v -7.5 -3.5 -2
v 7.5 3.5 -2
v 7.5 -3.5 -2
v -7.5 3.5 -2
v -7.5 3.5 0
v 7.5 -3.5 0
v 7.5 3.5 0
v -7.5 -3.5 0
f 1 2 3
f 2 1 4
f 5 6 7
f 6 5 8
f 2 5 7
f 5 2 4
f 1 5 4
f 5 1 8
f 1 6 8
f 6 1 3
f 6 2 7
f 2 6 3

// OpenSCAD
// file: ../p/4-4edge.scad
use <../lib.scad>
$fa=1; $fs=0.2;
function ldraw_lib__4_4edge(realsolid=false) = [
// 0 Circle 1.0
// 0 Name: 4-4edge.dat
// 0 Author: James Jessiman
// 0 !LDRAW_ORG Primitive UPDATE 2017-01
// 0 !LICENSE Licensed under CC BY 2.0 and CC BY 4.0 : see CAreadme.txt
// 
// 0 BFC CERTIFY CCW
  [0,"BFC","CERTIFY"],
  [0,"BFC","CCW"],
// 
// 0 !HISTORY 1998-12-15 [PTadmin] Official Update 1998-10
// 0 !HISTORY 2005-12-28 [PTadmin] Official Update 2005-01
// 0 !HISTORY 2007-06-24 [PTadmin] Header formatted for Contributor Agreement
// 0 !HISTORY 2008-07-01 [PTadmin] Official Update 2008-01
// 0 !HISTORY 2017-01-15 [Steffen] BFCed
// 0 !HISTORY 2017-12-30 [PTadmin] Official Update 2017-01
// 
// 
// 2 24 1 0 0 0.9239 0 0.3827
  [2,24,1,0,0,0.9239,0,0.3827],
// 2 24 0.9239 0 0.3827 0.7071 0 0.7071
  [2,24,0.9239,0,0.3827,0.7071,0,0.7071],
// 2 24 0.7071 0 0.7071 0.3827 0 0.9239
  [2,24,0.7071,0,0.7071,0.3827,0,0.9239],
// 2 24 0.3827 0 0.9239 0 0 1
  [2,24,0.3827,0,0.9239,0,0,1],
// 2 24 0 0 1 -0.3827 0 0.9239
  [2,24,0,0,1,-0.3827,0,0.9239],
// 2 24 -0.3827 0 0.9239 -0.7071 0 0.7071
  [2,24,-0.3827,0,0.9239,-0.7071,0,0.7071],
// 2 24 -0.7071 0 0.7071 -0.9239 0 0.3827
  [2,24,-0.7071,0,0.7071,-0.9239,0,0.3827],
// 2 24 -0.9239 0 0.3827 -1 0 -0
  [2,24,-0.9239,0,0.3827,-1,0,-0],
// 2 24 -1 0 -0 -0.9239 0 -0.3827
  [2,24,-1,0,-0,-0.9239,0,-0.3827],
// 2 24 -0.9239 0 -0.3827 -0.7071 0 -0.7071
  [2,24,-0.9239,0,-0.3827,-0.7071,0,-0.7071],
// 2 24 -0.7071 0 -0.7071 -0.3827 0 -0.9239
  [2,24,-0.7071,0,-0.7071,-0.3827,0,-0.9239],
// 2 24 -0.3827 0 -0.9239 0 0 -1
  [2,24,-0.3827,0,-0.9239,0,0,-1],
// 2 24 0 0 -1 0.3827 0 -0.9239
  [2,24,0,0,-1,0.3827,0,-0.9239],
// 2 24 0.3827 0 -0.9239 0.7071 0 -0.7071
  [2,24,0.3827,0,-0.9239,0.7071,0,-0.7071],
// 2 24 0.7071 0 -0.7071 0.9239 0 -0.3827
  [2,24,0.7071,0,-0.7071,0.9239,0,-0.3827],
// 2 24 0.9239 0 -0.3827 1 0 0
  [2,24,0.9239,0,-0.3827,1,0,0],
];
module ldraw_lib__4_4edge(step=0, col=false, unit=2/5, alt=false, line=0.2, solid=!$preview)
    makepoly(ldraw_lib__4_4edge(solid), step=step, col=col, unit=unit, alt=alt, line=line, solid=solid);
ldraw_lib__4_4edge(line=0.2);
// file: ../p/4-4disc.scad
use <../lib.scad>
$fa=1; $fs=0.2;
function ldraw_lib__4_4disc(realsolid=false) = [
// 0 Disc 1.0
// 0 Name: 4-4disc.dat
// 0 Author: James Jessiman
// 0 !LDRAW_ORG Primitive UPDATE 2002-02
// 0 !LICENSE Licensed under CC BY 2.0 and CC BY 4.0 : see CAreadme.txt
// 
// 0 BFC CERTIFY CCW
  [0,"BFC","CERTIFY"],
  [0,"BFC","CCW"],
// 
// 0 !HISTORY 1998-12-15 [PTadmin] Official Update 1998-10
// 0 !HISTORY 2002-03-23 [sbliss] Added BFC statement
// 0 !HISTORY 2002-04-25 [PTadmin] Official Update 2002-02
// 0 !HISTORY 2007-06-24 [PTadmin] Header formatted for Contributor Agreement
// 0 !HISTORY 2008-07-01 [PTadmin] Official Update 2008-01
// 
// 
// 3 16 0 0 0 1 0 0 0.9239 0 0.3827
  [3,16,0,0,0,1,0,0,0.9239,0,0.3827],
// 3 16 0 0 0 0.9239 0 0.3827 0.7071 0 0.7071
  [3,16,0,0,0,0.9239,0,0.3827,0.7071,0,0.7071],
// 3 16 0 0 0 0.7071 0 0.7071 0.3827 0 0.9239
  [3,16,0,0,0,0.7071,0,0.7071,0.3827,0,0.9239],
// 3 16 0 0 0 0.3827 0 0.9239 0 0 1
  [3,16,0,0,0,0.3827,0,0.9239,0,0,1],
// 3 16 0 0 0 0 0 1 -0.3827 0 0.9239
  [3,16,0,0,0,0,0,1,-0.3827,0,0.9239],
// 3 16 0 0 0 -0.3827 0 0.9239 -0.7071 0 0.7071
  [3,16,0,0,0,-0.3827,0,0.9239,-0.7071,0,0.7071],
// 3 16 0 0 0 -0.7071 0 0.7071 -0.9239 0 0.3827
  [3,16,0,0,0,-0.7071,0,0.7071,-0.9239,0,0.3827],
// 3 16 0 0 0 -0.9239 0 0.3827 -1 0 -0
  [3,16,0,0,0,-0.9239,0,0.3827,-1,0,-0],
// 3 16 0 0 0 -1 0 -0 -0.9239 0 -0.3827
  [3,16,0,0,0,-1,0,-0,-0.9239,0,-0.3827],
// 3 16 0 0 0 -0.9239 0 -0.3827 -0.7071 0 -0.7071
  [3,16,0,0,0,-0.9239,0,-0.3827,-0.7071,0,-0.7071],
// 3 16 0 0 0 -0.7071 0 -0.7071 -0.3827 0 -0.9239
  [3,16,0,0,0,-0.7071,0,-0.7071,-0.3827,0,-0.9239],
// 3 16 0 0 0 -0.3827 0 -0.9239 0 0 -1
  [3,16,0,0,0,-0.3827,0,-0.9239,0,0,-1],
// 3 16 0 0 0 0 0 -1 0.3827 0 -0.9239
  [3,16,0,0,0,0,0,-1,0.3827,0,-0.9239],
// 3 16 0 0 0 0.3827 0 -0.9239 0.7071 0 -0.7071
  [3,16,0,0,0,0.3827,0,-0.9239,0.7071,0,-0.7071],
// 3 16 0 0 0 0.7071 0 -0.7071 0.9239 0 -0.3827
  [3,16,0,0,0,0.7071,0,-0.7071,0.9239,0,-0.3827],
// 3 16 0 0 0 0.9239 0 -0.3827 1 0 0
  [3,16,0,0,0,0.9239,0,-0.3827,1,0,0],
// 0
];
module ldraw_lib__4_4disc(step=0, col=false, unit=2/5, alt=false, line=0.2, solid=!$preview)
    makepoly(ldraw_lib__4_4disc(solid), step=step, col=col, unit=unit, alt=alt, line=line, solid=solid);
ldraw_lib__4_4disc(line=0.2);
// file: ../p/4-4cyli.scad
use <../lib.scad>
$fa=1; $fs=0.2;
function ldraw_lib__4_4cyli(realsolid=false) = [
// 0 Cylinder 1.0
// 0 Name: 4-4cyli.dat
// 0 Author: James Jessiman
// 0 !LDRAW_ORG Primitive UPDATE 2005-01
// 0 !LICENSE Licensed under CC BY 2.0 and CC BY 4.0 : see CAreadme.txt
// 
// 0 BFC CERTIFY CCW
  [0,"BFC","CERTIFY"],
  [0,"BFC","CCW"],
// 
// 0 !HISTORY 1998-12-15 [PTadmin] Official Update 1998-10
// 0 !HISTORY 2002-03-23 [sbliss] Added BFC statement; merged headers from files in distributions LDraw 0.27 and Complete.
// 0 !HISTORY 2002-04-25 [PTadmin] Official Update 2002-02
// 0 !HISTORY 2004-12-14 [guyvivan] BFC CCW
// 0 !HISTORY 2005-12-28 [PTadmin] Official Update 2005-01
// 0 !HISTORY 2007-06-24 [PTadmin] Header formatted for Contributor Agreement
// 0 !HISTORY 2008-07-01 [PTadmin] Official Update 2008-01
// 
// 
// 4 16 1 1 0 0.9239 1 0.3827 0.9239 0 0.3827 1 0 0
  [4,16,1,1,0,0.9239,1,0.3827,0.9239,0,0.3827,1,0,0],
// 5 24 1 0 0 1 1 0 0.9239 0 0.3827 0.9239 0 -0.3827
  [5,24,1,0,0,1,1,0,0.9239,0,0.3827,0.9239,0,-0.3827],
// 4 16 0.9239 1 0.3827 0.7071 1 0.7071 0.7071 0 0.7071 0.9239 0 0.3827
  [4,16,0.9239,1,0.3827,0.7071,1,0.7071,0.7071,0,0.7071,0.9239,0,0.3827],
// 5 24 0.9239 0 0.3827 0.9239 1 0.3827 0.7071 0 0.7071 1 0 0
  [5,24,0.9239,0,0.3827,0.9239,1,0.3827,0.7071,0,0.7071,1,0,0],
// 4 16 0.7071 1 0.7071 0.3827 1 0.9239 0.3827 0 0.9239 0.7071 0 0.7071
  [4,16,0.7071,1,0.7071,0.3827,1,0.9239,0.3827,0,0.9239,0.7071,0,0.7071],
// 5 24 0.7071 0 0.7071 0.7071 1 0.7071 0.3827 0 0.9239 0.9239 0 0.3827
  [5,24,0.7071,0,0.7071,0.7071,1,0.7071,0.3827,0,0.9239,0.9239,0,0.3827],
// 4 16 0.3827 1 0.9239 0 1 1 0 0 1 0.3827 0 0.9239
  [4,16,0.3827,1,0.9239,0,1,1,0,0,1,0.3827,0,0.9239],
// 5 24 0.3827 0 0.9239 0.3827 1 0.9239 0 0 1 0.7071 0 0.7071
  [5,24,0.3827,0,0.9239,0.3827,1,0.9239,0,0,1,0.7071,0,0.7071],
// 4 16 0 1 1 -0.3827 1 0.9239 -0.3827 0 0.9239 0 0 1
  [4,16,0,1,1,-0.3827,1,0.9239,-0.3827,0,0.9239,0,0,1],
// 5 24 0 0 1 0 1 1 -0.3827 0 0.9239 0.3827 0 0.9239
  [5,24,0,0,1,0,1,1,-0.3827,0,0.9239,0.3827,0,0.9239],
// 4 16 -0.3827 1 0.9239 -0.7071 1 0.7071 -0.7071 0 0.7071 -0.3827 0 0.9239
  [4,16,-0.3827,1,0.9239,-0.7071,1,0.7071,-0.7071,0,0.7071,-0.3827,0,0.9239],
// 5 24 -0.3827 0 0.9239 -0.3827 1 0.9239 -0.7071 0 0.7071 0 0 1
  [5,24,-0.3827,0,0.9239,-0.3827,1,0.9239,-0.7071,0,0.7071,0,0,1],
// 4 16 -0.7071 1 0.7071 -0.9239 1 0.3827 -0.9239 0 0.3827 -0.7071 0 0.7071
  [4,16,-0.7071,1,0.7071,-0.9239,1,0.3827,-0.9239,0,0.3827,-0.7071,0,0.7071],
// 5 24 -0.7071 0 0.7071 -0.7071 1 0.7071 -0.9239 0 0.3827 -0.3827 0 0.9239
  [5,24,-0.7071,0,0.7071,-0.7071,1,0.7071,-0.9239,0,0.3827,-0.3827,0,0.9239],
// 4 16 -0.9239 1 0.3827 -1 1 0 -1 0 0 -0.9239 0 0.3827
  [4,16,-0.9239,1,0.3827,-1,1,0,-1,0,0,-0.9239,0,0.3827],
// 5 24 -0.9239 0 0.3827 -0.9239 1 0.3827 -1 0 0 -0.7071 0 0.7071
  [5,24,-0.9239,0,0.3827,-0.9239,1,0.3827,-1,0,0,-0.7071,0,0.7071],
// 4 16 -1 1 0 -0.9239 1 -0.3827 -0.9239 0 -0.3827 -1 0 0
  [4,16,-1,1,0,-0.9239,1,-0.3827,-0.9239,0,-0.3827,-1,0,0],
// 5 24 -1 0 0 -1 1 0 -0.9239 0 -0.3827 -0.9239 0 0.3827
  [5,24,-1,0,0,-1,1,0,-0.9239,0,-0.3827,-0.9239,0,0.3827],
// 4 16 -0.9239 1 -0.3827 -0.7071 1 -0.7071 -0.7071 0 -0.7071 -0.9239 0 -0.3827
  [4,16,-0.9239,1,-0.3827,-0.7071,1,-0.7071,-0.7071,0,-0.7071,-0.9239,0,-0.3827],
// 5 24 -0.9239 0 -0.3827 -0.9239 1 -0.3827 -0.7071 0 -0.7071 -1 0 0
  [5,24,-0.9239,0,-0.3827,-0.9239,1,-0.3827,-0.7071,0,-0.7071,-1,0,0],
// 4 16 -0.7071 1 -0.7071 -0.3827 1 -0.9239 -0.3827 0 -0.9239 -0.7071 0 -0.7071
  [4,16,-0.7071,1,-0.7071,-0.3827,1,-0.9239,-0.3827,0,-0.9239,-0.7071,0,-0.7071],
// 5 24 -0.7071 0 -0.7071 -0.7071 1 -0.7071 -0.3827 0 -0.9239 -0.9239 0 -0.3827
  [5,24,-0.7071,0,-0.7071,-0.7071,1,-0.7071,-0.3827,0,-0.9239,-0.9239,0,-0.3827],
// 4 16 -0.3827 1 -0.9239 0 1 -1 0 0 -1 -0.3827 0 -0.9239
  [4,16,-0.3827,1,-0.9239,0,1,-1,0,0,-1,-0.3827,0,-0.9239],
// 5 24 -0.3827 0 -0.9239 -0.3827 1 -0.9239 0 0 -1 -0.7071 0 -0.7071
  [5,24,-0.3827,0,-0.9239,-0.3827,1,-0.9239,0,0,-1,-0.7071,0,-0.7071],
// 4 16 0 1 -1 0.3827 1 -0.9239 0.3827 0 -0.9239 0 0 -1
  [4,16,0,1,-1,0.3827,1,-0.9239,0.3827,0,-0.9239,0,0,-1],
// 5 24 0 0 -1 0 1 -1 0.3827 0 -0.9239 -0.3827 0 -0.9239
  [5,24,0,0,-1,0,1,-1,0.3827,0,-0.9239,-0.3827,0,-0.9239],
// 4 16 0.3827 1 -0.9239 0.7071 1 -0.7071 0.7071 0 -0.7071 0.3827 0 -0.9239
  [4,16,0.3827,1,-0.9239,0.7071,1,-0.7071,0.7071,0,-0.7071,0.3827,0,-0.9239],
// 5 24 0.3827 0 -0.9239 0.3827 1 -0.9239 0.7071 0 -0.7071 0 0 -1
  [5,24,0.3827,0,-0.9239,0.3827,1,-0.9239,0.7071,0,-0.7071,0,0,-1],
// 4 16 0.7071 1 -0.7071 0.9239 1 -0.3827 0.9239 0 -0.3827 0.7071 0 -0.7071
  [4,16,0.7071,1,-0.7071,0.9239,1,-0.3827,0.9239,0,-0.3827,0.7071,0,-0.7071],
// 5 24 0.7071 0 -0.7071 0.7071 1 -0.7071 0.9239 0 -0.3827 0.3827 0 -0.9239
  [5,24,0.7071,0,-0.7071,0.7071,1,-0.7071,0.9239,0,-0.3827,0.3827,0,-0.9239],
// 4 16 0.9239 1 -0.3827 1 1 0 1 0 0 0.9239 0 -0.3827
  [4,16,0.9239,1,-0.3827,1,1,0,1,0,0,0.9239,0,-0.3827],
// 5 24 0.9239 0 -0.3827 0.9239 1 -0.3827 1 0 0 0.7071 0 -0.7071
  [5,24,0.9239,0,-0.3827,0.9239,1,-0.3827,1,0,0,0.7071,0,-0.7071],
// 0
];
module ldraw_lib__4_4cyli(step=0, col=false, unit=2/5, alt=false, line=0.2, solid=!$preview)
    makepoly(ldraw_lib__4_4cyli(solid), step=step, col=col, unit=unit, alt=alt, line=line, solid=solid);
ldraw_lib__4_4cyli(line=0.2);
// file: ../p/stud3.scad
use <../lib.scad>
use <4-4cyli.scad>
use <4-4disc.scad>
use <4-4edge.scad>
$fa=1; $fs=0.2;
function ldraw_lib__stud3(realsolid=false) = realsolid ? 
    [openscad(translate([0,0,-eps()], o=cylinder(4+eps(), r=4)),2)] : [
// 0 Stud Tube Solid
// 0 Name: stud3.dat
// 0 Author: James Jessiman
// 0 !LDRAW_ORG Primitive UPDATE 2012-01
// 0 !LICENSE Licensed under CC BY 2.0 and CC BY 4.0 : see CAreadme.txt
// 
// 0 BFC CERTIFY CCW
  [0,"BFC","CERTIFY"],
  [0,"BFC","CCW"],
// 
// 0 !HISTORY 2002-04-04 [sbliss] Modified for BFC compliance
// 0 !HISTORY 2002-04-25 [PTadmin] Official Update 2002-02
// 0 !HISTORY 2007-06-24 [PTadmin] Header formatted for Contributor Agreement
// 0 !HISTORY 2008-07-01 [PTadmin] Official Update 2008-01
// 0 !HISTORY 2012-02-16 [Philo] Changed to CCW
// 0 !HISTORY 2012-03-30 [PTadmin] Official Update 2012-01
// 
// 
// 1 16 0 -4 0 4 0 0 0 1 0 0 0 4 4-4edge.dat
  [1,16,0,-4,0,4,0,0,0,1,0,0,0,4, ldraw_lib__4_4edge(realsolid)],
// 1 16 0 0 0 4 0 0 0 1 0 0 0 4 4-4edge.dat
  [1,16,0,0,0,4,0,0,0,1,0,0,0,4, ldraw_lib__4_4edge(realsolid)],
// 1 16 0 -4 0 4 0 0 0 1 0 0 0 4 4-4disc.dat
  [1,16,0,-4,0,4,0,0,0,1,0,0,0,4, ldraw_lib__4_4disc(realsolid)],
// 1 16 0 -4 0 4 0 0 0 4 0 0 0 4 4-4cyli.dat
  [1,16,0,-4,0,4,0,0,0,4,0,0,0,4, ldraw_lib__4_4cyli(realsolid)],
];
module ldraw_lib__stud3(step=0, col=false, unit=2/5, alt=false, line=0.2, solid=!$preview)
    makepoly(ldraw_lib__stud3(solid), step=step, col=col, unit=unit, alt=alt, line=line, solid=solid);
ldraw_lib__stud3(line=0.2);
// file: ../p/stud.scad
use <../lib.scad>
use <4-4cyli.scad>
use <4-4disc.scad>
use <4-4edge.scad>
$fa=1; $fs=0.2;
function ldraw_lib__stud(realsolid=false) = realsolid ? 
    [openscad(translate([0,0,-eps()], o=cylinder(4+eps(), r=6)),2)] : [
// 0 Stud
// 0 Name: stud.dat
// 0 Author: James Jessiman
// 0 !LDRAW_ORG Primitive UPDATE 2012-01
// 0 !LICENSE Licensed under CC BY 2.0 and CC BY 4.0 : see CAreadme.txt
// 
// 0 BFC CERTIFY CCW
  [0,"BFC","CERTIFY"],
  [0,"BFC","CCW"],
// 
// 0 !HISTORY 2002-04-04 [sbliss] Modified for BFC compliance
// 0 !HISTORY 2002-04-25 [PTadmin] Official Update 2002-02
// 0 !HISTORY 2007-06-24 [PTadmin] Header formatted for Contributor Agreement
// 0 !HISTORY 2008-07-01 [PTadmin] Official Update 2008-01
// 0 !HISTORY 2012-02-16 [Philo] Changed to CCW
// 0 !HISTORY 2012-03-30 [PTadmin] Official Update 2012-01
// 
// 
// 1 16 0 0 0 6 0 0 0 1 0 0 0 6 4-4edge.dat
  [1,16,0,0,0,6,0,0,0,1,0,0,0,6, ldraw_lib__4_4edge(realsolid)],
// 1 16 0 -4 0 6 0 0 0 1 0 0 0 6 4-4edge.dat
  [1,16,0,-4,0,6,0,0,0,1,0,0,0,6, ldraw_lib__4_4edge(realsolid)],
// 1 16 0 0 0 6 0 0 0 -4 0 0 0 6 4-4cyli.dat
  [1,16,0,0,0,6,0,0,0,-4,0,0,0,6, ldraw_lib__4_4cyli(realsolid)],
// 1 16 0 -4 0 6 0 0 0 1 0 0 0 6 4-4disc.dat
  [1,16,0,-4,0,6,0,0,0,1,0,0,0,6, ldraw_lib__4_4disc(realsolid)],
];
module ldraw_lib__stud(step=0, col=false, unit=2/5, alt=false, line=0.2, solid=!$preview)
    makepoly(ldraw_lib__stud(solid), step=step, col=col, unit=unit, alt=alt, line=line, solid=solid);
ldraw_lib__stud(line=0.2);
// file: ../p/box5.scad
use <../lib.scad>
$fa=1; $fs=0.2;
function ldraw_lib__box5(realsolid=false) = [
// 0 Box with 5 Faces and All Edges
// 0 Name: box5.dat
// 0 Author: James Jessiman
// 0 !LDRAW_ORG Primitive UPDATE 2012-01
// 0 !LICENSE Licensed under CC BY 2.0 and CC BY 4.0 : see CAreadme.txt
// 
// 0 BFC CERTIFY CCW
  [0,"BFC","CERTIFY"],
  [0,"BFC","CCW"],
// 
// 0 !HISTORY 2002-04-03 [sbliss] Modified for BFC compliance
// 0 !HISTORY 2002-04-25 [PTadmin] Official Update 2002-02
// 0 !HISTORY 2007-06-24 [PTadmin] Header formatted for Contributor Agreement
// 0 !HISTORY 2008-07-01 [PTadmin] Official Update 2008-01
// 0 !HISTORY 2012-02-16 [Philo] Changed to CCW
// 0 !HISTORY 2012-03-30 [PTadmin] Official Update 2012-01
// 
// 
// 2 24 1 1 1 -1 1 1
  [2,24,1,1,1,-1,1,1],
// 2 24 -1 1 1 -1 1 -1
  [2,24,-1,1,1,-1,1,-1],
// 2 24 -1 1 -1 1 1 -1
  [2,24,-1,1,-1,1,1,-1],
// 2 24 1 1 -1 1 1 1
  [2,24,1,1,-1,1,1,1],
// 2 24 1 0 1 -1 0 1
  [2,24,1,0,1,-1,0,1],
// 2 24 -1 0 1 -1 0 -1
  [2,24,-1,0,1,-1,0,-1],
// 2 24 -1 0 -1 1 0 -1
  [2,24,-1,0,-1,1,0,-1],
// 2 24 1 0 -1 1 0 1
  [2,24,1,0,-1,1,0,1],
// 2 24 1 0 1 1 1 1
  [2,24,1,0,1,1,1,1],
// 2 24 -1 0 1 -1 1 1
  [2,24,-1,0,1,-1,1,1],
// 2 24 1 0 -1 1 1 -1
  [2,24,1,0,-1,1,1,-1],
// 2 24 -1 0 -1 -1 1 -1
  [2,24,-1,0,-1,-1,1,-1],
// 4 16 -1 1 1 1 1 1 1 1 -1 -1 1 -1
  [4,16,-1,1,1,1,1,1,1,1,-1,-1,1,-1],
// 4 16 -1 1 1 -1 0 1 1 0 1 1 1 1
  [4,16,-1,1,1,-1,0,1,1,0,1,1,1,1],
// 4 16 -1 1 -1 -1 0 -1 -1 0 1 -1 1 1
  [4,16,-1,1,-1,-1,0,-1,-1,0,1,-1,1,1],
// 4 16 1 1 -1 1 0 -1 -1 0 -1 -1 1 -1
  [4,16,1,1,-1,1,0,-1,-1,0,-1,-1,1,-1],
// 4 16 1 1 1 1 0 1 1 0 -1 1 1 -1
  [4,16,1,1,1,1,0,1,1,0,-1,1,1,-1],
];
module ldraw_lib__box5(step=0, col=false, unit=2/5, alt=false, line=0.2, solid=!$preview)
    makepoly(ldraw_lib__box5(solid), step=step, col=col, unit=unit, alt=alt, line=line, solid=solid);
ldraw_lib__box5(line=0.2);
// file: ../p/box4t.scad
use <../lib.scad>
$fa=1; $fs=0.2;
function ldraw_lib__box4t(realsolid=false) = [
// 0 Box with 4 Adjacent Faces and All Edges
// 0 Name: box4t.dat
// 0 Author: Tore Eriksson [Tore_Eriksson]
// 0 !LDRAW_ORG Primitive UPDATE 2003-02
// 0 !LICENSE Licensed under CC BY 2.0 and CC BY 4.0 : see CAreadme.txt
// 
// 0 BFC CERTIFY CCW
  [0,"BFC","CERTIFY"],
  [0,"BFC","CCW"],
// 
// 0 !HISTORY 1997-09-29 [PTadmin] Official Update 1997-15
// 0 !HISTORY 2002-08-31 [izanette] Modified with WINDZ for BFC compliance
// 0 !HISTORY 2003-08-01 [PTadmin] Official Update 2003-02
// 0 !HISTORY 2007-06-24 [PTadmin] Header formatted for Contributor Agreement
// 0 !HISTORY 2008-07-01 [PTadmin] Official Update 2008-01
// 
// 
// 2 24 1 1 1 -1 1 1
  [2,24,1,1,1,-1,1,1],
// 2 24 -1 1 1 -1 1 -1
  [2,24,-1,1,1,-1,1,-1],
// 2 24 -1 1 -1 1 1 -1
  [2,24,-1,1,-1,1,1,-1],
// 2 24 1 1 -1 1 1 1
  [2,24,1,1,-1,1,1,1],
// 2 24 1 0 1 -1 0 1
  [2,24,1,0,1,-1,0,1],
// 2 24 -1 0 1 -1 0 -1
  [2,24,-1,0,1,-1,0,-1],
// 2 24 -1 0 -1 1 0 -1
  [2,24,-1,0,-1,1,0,-1],
// 2 24 1 0 -1 1 0 1
  [2,24,1,0,-1,1,0,1],
// 2 24 1 0 1 1 1 1
  [2,24,1,0,1,1,1,1],
// 2 24 -1 0 1 -1 1 1
  [2,24,-1,0,1,-1,1,1],
// 2 24 1 0 -1 1 1 -1
  [2,24,1,0,-1,1,1,-1],
// 2 24 -1 0 -1 -1 1 -1
  [2,24,-1,0,-1,-1,1,-1],
// 4 16 1 1 1 1 1 -1 -1 1 -1 -1 1 1
  [4,16,1,1,1,1,1,-1,-1,1,-1,-1,1,1],
// 4 16 1 1 1 -1 1 1 -1 0 1 1 0 1
  [4,16,1,1,1,-1,1,1,-1,0,1,1,0,1],
// 4 16 -1 1 1 -1 1 -1 -1 0 -1 -1 0 1
  [4,16,-1,1,1,-1,1,-1,-1,0,-1,-1,0,1],
// 0 4 16 -1 1 -1 -1 0 -1 1 0 -1 1 1 -1
// 4 16 1 1 -1 1 1 1 1 0 1 1 0 -1
  [4,16,1,1,-1,1,1,1,1,0,1,1,0,-1],
// 0
];
module ldraw_lib__box4t(step=0, col=false, unit=2/5, alt=false, line=0.2, solid=!$preview)
    makepoly(ldraw_lib__box4t(solid), step=step, col=col, unit=unit, alt=alt, line=line, solid=solid);
ldraw_lib__box4t(line=0.2);
// file: s/3004s01.scad
use <../../lib.scad>
use <../../p/box4t.scad>
use <../../p/box5.scad>
use <../../p/stud.scad>
use <../../p/stud3.scad>
$fa=1; $fs=0.2;
function ldraw_lib__s__3004s01(realsolid=false) = [
// 0 ~Brick  1 x  2 without Front Face
// 0 Name: s\3004s01.dat
// 0 Author: James Jessiman
// 0 !LDRAW_ORG Subpart UPDATE 2003-03
// 0 !LICENSE Licensed under CC BY 2.0 and CC BY 4.0 : see CAreadme.txt
// 
// 0 BFC CERTIFY CCW
  [0,"BFC","CERTIFY"],
  [0,"BFC","CCW"],
// 
// 0 !HISTORY 2003-09-07 [jriley] Subfiling, BFC
// 0 !HISTORY 2003-12-19 [PTadmin] Official Update 2003-03
// 0 !HISTORY 2007-08-29 [PTadmin] Header formatted for Contributor Agreement
// 0 !HISTORY 2008-07-01 [PTadmin] Official Update 2008-01
// 
// 
// 1 16 0 4 0 1 0 0 0 -5 0 0 0 1 stud3.dat
  [1,16,0,4,0,1,0,0,0,-5,0,0,0,1, ldraw_lib__stud3(realsolid)],
// 0 BFC INVERTNEXT
  [0,"BFC","INVERTNEXT"],
// 1 16 0 24 0 16 0 0 0 -20 0 0 0 6 box5.dat
  [1,16,0,24,0,16,0,0,0,-20,0,0,0,6, ldraw_lib__box5(realsolid)],
// 4 16 20 24 10 16 24 6 -16 24 6 -20 24 10
  [4,16,20,24,10,16,24,6,-16,24,6,-20,24,10],
// 4 16 -20 24 10 -16 24 6 -16 24 -6 -20 24 -10
  [4,16,-20,24,10,-16,24,6,-16,24,-6,-20,24,-10],
// 4 16 -20 24 -10 -16 24 -6 16 24 -6 20 24 -10
  [4,16,-20,24,-10,-16,24,-6,16,24,-6,20,24,-10],
// 4 16 20 24 -10 16 24 -6 16 24 6 20 24 10
  [4,16,20,24,-10,16,24,-6,16,24,6,20,24,10],
// 1 16 0 24 0 20 0 0 0 -24 0 0 0 10 box4t.dat
  [1,16,0,24,0,20,0,0,0,-24,0,0,0,10, ldraw_lib__box4t(realsolid)],
// 1 16 10 0 0 1 0 0 0 1 0 0 0 1 stud.dat
  [1,16,10,0,0,1,0,0,0,1,0,0,0,1, ldraw_lib__stud(realsolid)],
// 1 16 -10 0 0 1 0 0 0 1 0 0 0 1 stud.dat
  [1,16,-10,0,0,1,0,0,0,1,0,0,0,1, ldraw_lib__stud(realsolid)],
// 0
];
module ldraw_lib__s__3004s01(step=0, col=false, unit=2/5, alt=false, line=0.2, solid=!$preview)
    makepoly(ldraw_lib__s__3004s01(solid), step=step, col=col, unit=unit, alt=alt, line=line, solid=solid);
ldraw_lib__s__3004s01(line=0.2);
// file: 3004.scad
use <../lib.scad>
use <s/3004s01.scad>
$fa=1; $fs=0.2;
function ldraw_lib__3004(realsolid=false) = [
// 0 Brick  1 x  2
// 0 Name: 3004.dat
// 0 Author: James Jessiman
// 0 !LDRAW_ORG Part UPDATE 2022-05
// 0 !LICENSE Licensed under CC BY 2.0 and CC BY 4.0 : see CAreadme.txt
// 
// 0 BFC CERTIFY CCW
  [0,"BFC","CERTIFY"],
  [0,"BFC","CCW"],
// 
// 0 !HISTORY 2001-10-26 [PTadmin] Official Update 2001-01
// 0 !HISTORY 2002-05-07 {unknown} BFC Certification
// 0 !HISTORY 2002-06-11 [PTadmin] Official Update 2002-03
// 0 !HISTORY 2007-05-07 [PTadmin] Header formatted for Contributor Agreement
// 0 !HISTORY 2008-07-01 [PTadmin] Official Update 2008-01
// 0 !HISTORY 2022-08-04 [MagFors] Using subfile
// 0 !HISTORY 2022-09-15 [PTadmin] Official Update 2022-05
// 
// 
// 1 16 0 0 0 1 0 0 0 1 0 0 0 1 s\3004s01.dat
  [1,16,0,0,0,1,0,0,0,1,0,0,0,1, ldraw_lib__s__3004s01(realsolid)],
// 4 16 -20 24 -10 20 24 -10 20 0 -10 -20 0 -10
  [4,16,-20,24,-10,20,24,-10,20,0,-10,-20,0,-10],
];
module ldraw_lib__3004(step=0, col=false, unit=2/5, alt=false, line=0.2, solid=!$preview)
    makepoly(ldraw_lib__3004(solid), step=step, col=col, unit=unit, alt=alt, line=line, solid=solid);
ldraw_lib__3004(line=0.2);
// file: ../p/box.scad
use <../lib.scad>
$fa=1; $fs=0.2;
function ldraw_lib__box(realsolid=false) = [
// 0 Box 6 (six faces)
// 0 Name: box.dat
// 0 Author: James Jessiman
// 0 !LDRAW_ORG Primitive UPDATE 2002-05
// 0 !LICENSE Licensed under CC BY 2.0 and CC BY 4.0 : see CAreadme.txt
// 
// 0 BFC CERTIFY CCW
  [0,"BFC","CERTIFY"],
  [0,"BFC","CCW"],
// 
// 0 !HISTORY 2002-08-22 [sbliss] Applied BFC
// 0 !HISTORY 2002-11-30 [PTadmin] Official Update 2002-05
// 0 !HISTORY 2007-06-24 [PTadmin] Header formatted for Contributor Agreement
// 0 !HISTORY 2008-07-01 [PTadmin] Official Update 2008-01
// 
// 
// 2 24 1 1 1 -1 1 1
  [2,24,1,1,1,-1,1,1],
// 2 24 -1 1 1 -1 1 -1
  [2,24,-1,1,1,-1,1,-1],
// 2 24 -1 1 -1 1 1 -1
  [2,24,-1,1,-1,1,1,-1],
// 2 24 1 1 -1 1 1 1
  [2,24,1,1,-1,1,1,1],
// 2 24 1 -1 1 -1 -1 1
  [2,24,1,-1,1,-1,-1,1],
// 2 24 -1 -1 1 -1 -1 -1
  [2,24,-1,-1,1,-1,-1,-1],
// 2 24 -1 -1 -1 1 -1 -1
  [2,24,-1,-1,-1,1,-1,-1],
// 2 24 1 -1 -1 1 -1 1
  [2,24,1,-1,-1,1,-1,1],
// 2 24 1 -1 1 1 1 1
  [2,24,1,-1,1,1,1,1],
// 2 24 -1 -1 1 -1 1 1
  [2,24,-1,-1,1,-1,1,1],
// 2 24 1 -1 -1 1 1 -1
  [2,24,1,-1,-1,1,1,-1],
// 2 24 -1 -1 -1 -1 1 -1
  [2,24,-1,-1,-1,-1,1,-1],
// 4 16 1 1 1 1 1 -1 -1 1 -1 -1 1 1
  [4,16,1,1,1,1,1,-1,-1,1,-1,-1,1,1],
// 4 16 -1 -1 -1 1 -1 -1 1 -1 1 -1 -1 1
  [4,16,-1,-1,-1,1,-1,-1,1,-1,1,-1,-1,1],
// 4 16 -1 -1 1 1 -1 1 1 1 1 -1 1 1
  [4,16,-1,-1,1,1,-1,1,1,1,1,-1,1,1],
// 4 16 -1 -1 -1 -1 -1 1 -1 1 1 -1 1 -1
  [4,16,-1,-1,-1,-1,-1,1,-1,1,1,-1,1,-1],
// 4 16 1 -1 -1 -1 -1 -1 -1 1 -1 1 1 -1
  [4,16,1,-1,-1,-1,-1,-1,-1,1,-1,1,1,-1],
// 4 16 1 -1 1 1 -1 -1 1 1 -1 1 1 1
  [4,16,1,-1,1,1,-1,-1,1,1,-1,1,1,1],
// 0
];
module ldraw_lib__box(step=0, col=false, unit=2/5, alt=false, line=0.2, solid=!$preview)
    makepoly(ldraw_lib__box(solid), step=step, col=col, unit=unit, alt=alt, line=line, solid=solid);
ldraw_lib__box(line=0.2);
// main file
use <../lib.scad>
use <../p/box.scad>
$fa=1; $fs=0.2;
function ldraw_lib__u9264(realsolid=false) = [
// 0 ~Magnet  1.875 x  0.25 x  0.875
// 0 Name: u9264.dat
// 0 Author: Max Martin Richter [MMR1988]
// 0 !LDRAW_ORG Part UPDATE 2013-01
// 0 !LICENSE Licensed under CC BY 2.0 and CC BY 4.0 : see CAreadme.txt
// 
// 0 BFC CERTIFY CCW
  [0,"BFC","CERTIFY"],
  [0,"BFC","CCW"],
// 
// 0 !HISTORY 2013-07-21 [PTadmin] Official Update 2013-01
// 
// 
// 1 16 0 2.5 0 18.75 0 0 0 2.5 0 0 0 8.75 box.dat
  [1,16,0,2.5,0,18.75,0,0,0,2.5,0,0,0,8.75, ldraw_lib__box(realsolid)],
];
module ldraw_lib__u9264(step=0, col=false, unit=2/5, alt=false, line=0.2, solid=!$preview)
    makepoly(ldraw_lib__u9264(solid), step=step, col=col, unit=unit, alt=alt, line=line, solid=solid);
ldraw_lib__u9264(line=0.2);
